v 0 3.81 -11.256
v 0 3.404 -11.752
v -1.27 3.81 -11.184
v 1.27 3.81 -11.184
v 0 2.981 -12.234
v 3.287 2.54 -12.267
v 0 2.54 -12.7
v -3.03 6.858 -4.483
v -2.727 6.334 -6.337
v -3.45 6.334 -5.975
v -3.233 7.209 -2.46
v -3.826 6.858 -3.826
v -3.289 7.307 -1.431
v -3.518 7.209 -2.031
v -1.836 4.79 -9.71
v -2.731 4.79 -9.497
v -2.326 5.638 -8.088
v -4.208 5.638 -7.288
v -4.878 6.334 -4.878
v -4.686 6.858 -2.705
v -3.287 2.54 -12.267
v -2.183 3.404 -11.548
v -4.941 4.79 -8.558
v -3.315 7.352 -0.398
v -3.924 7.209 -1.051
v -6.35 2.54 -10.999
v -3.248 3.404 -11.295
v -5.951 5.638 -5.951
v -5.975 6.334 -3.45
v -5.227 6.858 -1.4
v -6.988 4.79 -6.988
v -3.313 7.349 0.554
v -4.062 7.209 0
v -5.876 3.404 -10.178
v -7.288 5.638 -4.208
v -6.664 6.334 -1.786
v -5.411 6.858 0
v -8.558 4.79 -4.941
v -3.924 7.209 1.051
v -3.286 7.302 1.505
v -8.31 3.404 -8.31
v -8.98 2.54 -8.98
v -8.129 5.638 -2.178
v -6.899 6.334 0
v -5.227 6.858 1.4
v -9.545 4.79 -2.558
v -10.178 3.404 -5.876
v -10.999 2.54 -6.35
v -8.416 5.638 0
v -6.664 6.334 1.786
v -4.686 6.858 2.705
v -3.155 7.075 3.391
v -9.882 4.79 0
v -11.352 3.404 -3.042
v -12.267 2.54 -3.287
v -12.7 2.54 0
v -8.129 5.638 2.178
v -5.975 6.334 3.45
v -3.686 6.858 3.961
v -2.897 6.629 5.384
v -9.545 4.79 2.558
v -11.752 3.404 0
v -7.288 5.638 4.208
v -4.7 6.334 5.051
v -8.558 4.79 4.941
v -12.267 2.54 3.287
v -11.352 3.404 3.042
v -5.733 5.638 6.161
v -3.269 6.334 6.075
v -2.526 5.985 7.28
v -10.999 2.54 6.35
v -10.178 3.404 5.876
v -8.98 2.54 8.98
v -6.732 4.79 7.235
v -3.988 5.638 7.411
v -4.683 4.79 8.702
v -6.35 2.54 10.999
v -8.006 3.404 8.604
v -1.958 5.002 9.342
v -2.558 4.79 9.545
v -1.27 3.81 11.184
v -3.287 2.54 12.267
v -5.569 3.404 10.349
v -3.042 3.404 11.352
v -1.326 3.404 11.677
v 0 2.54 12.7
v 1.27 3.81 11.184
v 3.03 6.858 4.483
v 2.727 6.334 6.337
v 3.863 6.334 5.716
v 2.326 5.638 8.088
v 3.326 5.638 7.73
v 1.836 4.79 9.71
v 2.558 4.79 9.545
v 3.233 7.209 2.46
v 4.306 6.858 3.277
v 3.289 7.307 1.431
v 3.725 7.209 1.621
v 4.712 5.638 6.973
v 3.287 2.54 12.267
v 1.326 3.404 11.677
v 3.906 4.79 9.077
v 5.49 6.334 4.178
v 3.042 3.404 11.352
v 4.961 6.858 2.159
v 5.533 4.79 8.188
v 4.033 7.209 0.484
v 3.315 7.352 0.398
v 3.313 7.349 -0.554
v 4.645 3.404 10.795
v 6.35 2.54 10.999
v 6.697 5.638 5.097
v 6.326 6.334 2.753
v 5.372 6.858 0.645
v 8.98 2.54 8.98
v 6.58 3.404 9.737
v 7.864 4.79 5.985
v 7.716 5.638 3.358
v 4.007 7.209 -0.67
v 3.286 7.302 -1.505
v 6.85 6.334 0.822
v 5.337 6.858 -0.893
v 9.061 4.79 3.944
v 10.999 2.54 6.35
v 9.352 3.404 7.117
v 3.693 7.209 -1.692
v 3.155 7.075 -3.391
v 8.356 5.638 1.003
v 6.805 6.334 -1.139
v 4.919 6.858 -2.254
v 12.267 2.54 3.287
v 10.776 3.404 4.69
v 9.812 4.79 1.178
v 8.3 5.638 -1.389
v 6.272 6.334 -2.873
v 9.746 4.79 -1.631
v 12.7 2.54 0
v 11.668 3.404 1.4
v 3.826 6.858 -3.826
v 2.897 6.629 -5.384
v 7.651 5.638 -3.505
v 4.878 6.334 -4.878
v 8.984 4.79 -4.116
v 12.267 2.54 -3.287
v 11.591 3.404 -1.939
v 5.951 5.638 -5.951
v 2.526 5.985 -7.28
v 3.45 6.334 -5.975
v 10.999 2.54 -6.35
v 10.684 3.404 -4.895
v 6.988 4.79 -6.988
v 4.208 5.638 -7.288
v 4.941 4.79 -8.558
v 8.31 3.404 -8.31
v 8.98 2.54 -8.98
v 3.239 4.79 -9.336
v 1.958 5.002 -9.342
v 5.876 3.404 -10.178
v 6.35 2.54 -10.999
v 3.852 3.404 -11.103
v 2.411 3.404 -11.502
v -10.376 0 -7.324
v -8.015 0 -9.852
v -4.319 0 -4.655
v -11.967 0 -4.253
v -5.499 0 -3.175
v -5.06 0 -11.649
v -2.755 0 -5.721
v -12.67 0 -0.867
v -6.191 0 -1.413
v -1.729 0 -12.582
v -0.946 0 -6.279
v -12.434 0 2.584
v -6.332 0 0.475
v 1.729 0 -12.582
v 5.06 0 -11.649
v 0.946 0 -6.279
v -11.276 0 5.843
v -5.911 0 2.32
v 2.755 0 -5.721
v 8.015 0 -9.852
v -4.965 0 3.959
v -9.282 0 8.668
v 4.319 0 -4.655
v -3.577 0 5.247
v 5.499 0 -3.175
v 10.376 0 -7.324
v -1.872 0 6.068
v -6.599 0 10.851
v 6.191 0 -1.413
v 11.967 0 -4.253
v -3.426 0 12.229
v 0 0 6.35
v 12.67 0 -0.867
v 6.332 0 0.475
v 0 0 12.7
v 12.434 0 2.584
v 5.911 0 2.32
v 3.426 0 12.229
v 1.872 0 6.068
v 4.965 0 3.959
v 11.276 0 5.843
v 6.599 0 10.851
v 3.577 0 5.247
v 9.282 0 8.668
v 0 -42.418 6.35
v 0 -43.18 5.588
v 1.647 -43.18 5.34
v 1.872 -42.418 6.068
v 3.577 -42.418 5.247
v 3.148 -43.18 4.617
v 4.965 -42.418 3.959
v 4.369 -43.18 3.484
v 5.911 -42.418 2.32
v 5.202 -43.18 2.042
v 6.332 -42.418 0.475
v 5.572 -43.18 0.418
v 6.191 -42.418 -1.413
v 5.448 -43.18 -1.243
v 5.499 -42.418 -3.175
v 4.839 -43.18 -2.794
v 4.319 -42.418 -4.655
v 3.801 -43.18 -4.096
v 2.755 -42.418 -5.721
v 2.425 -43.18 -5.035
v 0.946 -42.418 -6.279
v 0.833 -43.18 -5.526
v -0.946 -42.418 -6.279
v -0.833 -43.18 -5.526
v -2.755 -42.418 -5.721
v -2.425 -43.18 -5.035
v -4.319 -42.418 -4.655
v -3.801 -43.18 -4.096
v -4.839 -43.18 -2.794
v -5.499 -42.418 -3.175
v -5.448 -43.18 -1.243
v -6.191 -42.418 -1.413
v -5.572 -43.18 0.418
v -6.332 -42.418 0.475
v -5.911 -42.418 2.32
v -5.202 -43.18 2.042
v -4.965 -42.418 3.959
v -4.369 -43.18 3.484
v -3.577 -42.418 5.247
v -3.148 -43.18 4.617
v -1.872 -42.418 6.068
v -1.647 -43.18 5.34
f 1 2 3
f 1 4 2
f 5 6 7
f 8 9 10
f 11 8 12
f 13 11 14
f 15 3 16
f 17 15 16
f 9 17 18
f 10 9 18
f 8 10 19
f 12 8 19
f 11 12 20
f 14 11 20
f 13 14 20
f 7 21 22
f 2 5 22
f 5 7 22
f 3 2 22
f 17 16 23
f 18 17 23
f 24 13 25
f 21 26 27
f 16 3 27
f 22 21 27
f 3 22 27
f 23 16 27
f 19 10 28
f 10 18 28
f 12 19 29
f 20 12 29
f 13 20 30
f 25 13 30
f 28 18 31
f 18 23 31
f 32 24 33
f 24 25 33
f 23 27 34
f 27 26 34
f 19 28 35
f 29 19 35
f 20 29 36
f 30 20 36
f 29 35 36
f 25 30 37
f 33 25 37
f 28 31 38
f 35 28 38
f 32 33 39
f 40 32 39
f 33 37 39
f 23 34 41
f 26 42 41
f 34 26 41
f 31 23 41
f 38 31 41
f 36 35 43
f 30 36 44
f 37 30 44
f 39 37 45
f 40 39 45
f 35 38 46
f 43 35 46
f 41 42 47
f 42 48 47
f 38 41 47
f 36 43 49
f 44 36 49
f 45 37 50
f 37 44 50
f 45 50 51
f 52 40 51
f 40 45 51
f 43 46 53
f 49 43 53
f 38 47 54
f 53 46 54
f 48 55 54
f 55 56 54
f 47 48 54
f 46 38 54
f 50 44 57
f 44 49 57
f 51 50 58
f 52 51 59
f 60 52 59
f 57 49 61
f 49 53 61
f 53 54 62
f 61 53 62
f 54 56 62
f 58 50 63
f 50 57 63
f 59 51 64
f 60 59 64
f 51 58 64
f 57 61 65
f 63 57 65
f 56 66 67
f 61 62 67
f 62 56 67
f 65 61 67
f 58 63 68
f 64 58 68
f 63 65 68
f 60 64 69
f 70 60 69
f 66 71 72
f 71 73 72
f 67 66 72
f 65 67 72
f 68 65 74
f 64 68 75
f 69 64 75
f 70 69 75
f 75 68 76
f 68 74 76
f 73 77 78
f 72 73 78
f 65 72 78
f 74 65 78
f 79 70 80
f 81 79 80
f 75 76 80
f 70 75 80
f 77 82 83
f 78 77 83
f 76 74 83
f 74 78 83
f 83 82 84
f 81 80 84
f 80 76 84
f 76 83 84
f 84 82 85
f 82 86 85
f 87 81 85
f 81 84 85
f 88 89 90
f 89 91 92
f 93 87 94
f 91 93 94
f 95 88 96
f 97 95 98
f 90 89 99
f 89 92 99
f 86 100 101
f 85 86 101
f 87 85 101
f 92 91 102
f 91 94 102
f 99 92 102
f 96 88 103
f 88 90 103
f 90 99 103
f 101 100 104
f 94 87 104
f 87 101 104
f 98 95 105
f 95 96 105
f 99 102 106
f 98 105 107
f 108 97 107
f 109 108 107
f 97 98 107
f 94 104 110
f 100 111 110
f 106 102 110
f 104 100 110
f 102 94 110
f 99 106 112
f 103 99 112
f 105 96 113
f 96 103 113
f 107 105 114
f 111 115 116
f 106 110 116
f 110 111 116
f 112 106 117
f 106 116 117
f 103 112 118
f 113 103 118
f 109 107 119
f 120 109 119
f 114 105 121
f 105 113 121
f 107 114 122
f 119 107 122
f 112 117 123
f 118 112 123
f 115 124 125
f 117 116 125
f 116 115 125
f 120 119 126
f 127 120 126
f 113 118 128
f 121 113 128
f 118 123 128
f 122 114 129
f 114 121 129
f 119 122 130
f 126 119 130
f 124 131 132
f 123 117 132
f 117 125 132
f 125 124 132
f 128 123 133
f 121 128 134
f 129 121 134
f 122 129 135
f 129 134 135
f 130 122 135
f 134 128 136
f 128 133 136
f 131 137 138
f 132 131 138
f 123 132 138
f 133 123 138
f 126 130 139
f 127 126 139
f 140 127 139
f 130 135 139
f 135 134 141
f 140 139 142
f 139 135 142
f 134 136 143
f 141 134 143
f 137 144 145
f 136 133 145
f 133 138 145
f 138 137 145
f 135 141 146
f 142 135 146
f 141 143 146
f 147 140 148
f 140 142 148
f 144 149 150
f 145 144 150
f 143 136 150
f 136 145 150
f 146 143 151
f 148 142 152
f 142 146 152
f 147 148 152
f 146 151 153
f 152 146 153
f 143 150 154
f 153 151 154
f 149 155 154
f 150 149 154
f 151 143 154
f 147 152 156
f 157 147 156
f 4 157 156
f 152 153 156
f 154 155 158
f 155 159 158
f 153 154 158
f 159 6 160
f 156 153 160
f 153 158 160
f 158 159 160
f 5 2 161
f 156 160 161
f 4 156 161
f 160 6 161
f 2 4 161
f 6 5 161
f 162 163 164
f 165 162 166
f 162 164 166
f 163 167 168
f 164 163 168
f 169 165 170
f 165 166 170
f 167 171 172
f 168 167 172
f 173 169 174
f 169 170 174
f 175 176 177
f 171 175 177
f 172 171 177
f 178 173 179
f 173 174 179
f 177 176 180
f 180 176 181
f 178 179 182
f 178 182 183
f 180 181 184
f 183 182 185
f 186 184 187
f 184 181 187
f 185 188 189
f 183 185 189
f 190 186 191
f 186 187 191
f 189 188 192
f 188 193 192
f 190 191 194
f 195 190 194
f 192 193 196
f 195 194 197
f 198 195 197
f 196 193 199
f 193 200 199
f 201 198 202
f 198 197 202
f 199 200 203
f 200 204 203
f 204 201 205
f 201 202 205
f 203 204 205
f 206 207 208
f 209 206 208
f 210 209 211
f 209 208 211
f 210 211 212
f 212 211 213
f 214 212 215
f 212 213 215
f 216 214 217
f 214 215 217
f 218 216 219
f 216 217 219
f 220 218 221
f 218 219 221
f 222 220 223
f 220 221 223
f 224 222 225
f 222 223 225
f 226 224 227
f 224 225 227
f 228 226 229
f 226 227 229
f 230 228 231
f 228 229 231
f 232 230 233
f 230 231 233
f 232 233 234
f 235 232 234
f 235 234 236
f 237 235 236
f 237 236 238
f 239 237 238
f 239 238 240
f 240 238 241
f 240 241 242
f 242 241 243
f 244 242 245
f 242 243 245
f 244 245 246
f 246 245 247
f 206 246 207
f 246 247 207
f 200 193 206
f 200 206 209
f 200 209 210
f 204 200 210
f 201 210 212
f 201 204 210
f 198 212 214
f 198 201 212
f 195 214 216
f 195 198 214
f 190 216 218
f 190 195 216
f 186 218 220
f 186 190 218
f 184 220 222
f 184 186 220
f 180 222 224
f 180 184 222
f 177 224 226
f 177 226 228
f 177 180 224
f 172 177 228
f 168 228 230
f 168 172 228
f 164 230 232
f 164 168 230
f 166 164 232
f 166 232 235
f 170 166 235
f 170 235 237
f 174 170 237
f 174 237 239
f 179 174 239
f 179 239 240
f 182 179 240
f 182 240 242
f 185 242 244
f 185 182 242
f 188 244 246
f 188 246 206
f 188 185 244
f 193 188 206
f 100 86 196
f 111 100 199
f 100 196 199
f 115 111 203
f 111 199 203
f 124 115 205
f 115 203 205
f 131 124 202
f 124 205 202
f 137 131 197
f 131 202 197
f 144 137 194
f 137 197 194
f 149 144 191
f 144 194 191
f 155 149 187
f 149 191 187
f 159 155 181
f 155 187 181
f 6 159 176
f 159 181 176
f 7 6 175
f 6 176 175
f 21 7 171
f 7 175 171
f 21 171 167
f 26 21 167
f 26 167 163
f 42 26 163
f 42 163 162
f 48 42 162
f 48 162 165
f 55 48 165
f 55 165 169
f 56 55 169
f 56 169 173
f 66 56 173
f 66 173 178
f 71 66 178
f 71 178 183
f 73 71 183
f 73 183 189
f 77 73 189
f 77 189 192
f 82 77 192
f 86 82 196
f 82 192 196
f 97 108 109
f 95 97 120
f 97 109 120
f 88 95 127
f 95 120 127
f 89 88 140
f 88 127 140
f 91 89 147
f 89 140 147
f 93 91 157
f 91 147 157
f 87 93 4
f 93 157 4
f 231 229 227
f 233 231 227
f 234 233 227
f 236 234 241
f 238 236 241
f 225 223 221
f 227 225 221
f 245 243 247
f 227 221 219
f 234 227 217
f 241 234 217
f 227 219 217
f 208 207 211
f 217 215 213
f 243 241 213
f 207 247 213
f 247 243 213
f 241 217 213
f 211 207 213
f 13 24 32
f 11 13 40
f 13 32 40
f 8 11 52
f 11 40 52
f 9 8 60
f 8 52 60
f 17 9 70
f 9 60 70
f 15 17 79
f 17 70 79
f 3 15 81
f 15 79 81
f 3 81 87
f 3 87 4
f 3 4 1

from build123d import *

# Parameters (mm, degrees)
SKETCH1_R           = 6.35
BOSS_EXTRUDE1_DEPTH = 43.18
SKETCH1_3_R         = 12.7
BOSS_EXTRUDE2_DEPTH = 7.62
SKETCH4_W           = 2.54
SKETCH4_H           = 33.82833048
CUT_EXTRUDE1_DEPTH  = 51.305467944
CUT_EXTRUDE1_TAPER  = -30
CHAMFER1_SIZE       = 0.762


with BuildPart() as part:
    # Sketch1 → Boss-Extrude1 (new body)
    with BuildSketch(Plane(origin=(0, 0, 0), x_dir=(1, 0, 0), z_dir=(0, 1, 0))):
        with Locations(Location((0, 0, 0), (0, 0, 270))):
            Circle(SKETCH1_R)
    extrude(amount=-BOSS_EXTRUDE1_DEPTH)

    # Sketch1<3> → Boss-Extrude2 (add)
    with BuildSketch(Plane(origin=(0, 0, 0), x_dir=(1, 0, 0), z_dir=(0, 1, 0))):
        with Locations(Location((0, 0, 0), (0, 0, 270))):
            Circle(SKETCH1_3_R)
    extrude(amount=BOSS_EXTRUDE2_DEPTH)

    # Sketch3 → Cut-Revolve1 (revolve, cut)
    with BuildSketch(Plane.XY, mode=Mode.PRIVATE) as cut_revolve1_sk:
        with BuildLine():
            Line((-12.7, 2.54), (-15.209374463, 2.54))
            Line((-15.209374463, 2.54), (-15.209374463, 10.331344658))
            Line((-15.209374463, 10.331344658), (0, 10.331344658))
            Line((0, 10.331344658), (0, 7.62))
            ThreePointArc((0, 7.62), (-6.858056154, 6.350140386), (-12.7, 2.54))
        make_face()
    revolve(cut_revolve1_sk.sketch.rotate(Axis((0, 0, 0), (0, 1, 0)), 270), axis=Axis((0, 0, 0), (0, 1, 0)), mode=Mode.SUBTRACT)

    # Sketch4 → Cut-Extrude1 (cut, through all)
    with BuildSketch(Plane(origin=(0, 3.81, 0), x_dir=(1, 0, 0), z_dir=(0, 1, 0))):
        Rectangle(SKETCH4_W, SKETCH4_H)
    extrude(amount=CUT_EXTRUDE1_DEPTH, taper=CUT_EXTRUDE1_TAPER, mode=Mode.SUBTRACT)

    # Chamfer1
    chamfer1_edges = [part.edges().sort_by_distance(p)[0] for p in [
        (0, -43.18, -6.35),
    ]]
    chamfer(chamfer1_edges, length=CHAMFER1_SIZE)


solid = part.part
